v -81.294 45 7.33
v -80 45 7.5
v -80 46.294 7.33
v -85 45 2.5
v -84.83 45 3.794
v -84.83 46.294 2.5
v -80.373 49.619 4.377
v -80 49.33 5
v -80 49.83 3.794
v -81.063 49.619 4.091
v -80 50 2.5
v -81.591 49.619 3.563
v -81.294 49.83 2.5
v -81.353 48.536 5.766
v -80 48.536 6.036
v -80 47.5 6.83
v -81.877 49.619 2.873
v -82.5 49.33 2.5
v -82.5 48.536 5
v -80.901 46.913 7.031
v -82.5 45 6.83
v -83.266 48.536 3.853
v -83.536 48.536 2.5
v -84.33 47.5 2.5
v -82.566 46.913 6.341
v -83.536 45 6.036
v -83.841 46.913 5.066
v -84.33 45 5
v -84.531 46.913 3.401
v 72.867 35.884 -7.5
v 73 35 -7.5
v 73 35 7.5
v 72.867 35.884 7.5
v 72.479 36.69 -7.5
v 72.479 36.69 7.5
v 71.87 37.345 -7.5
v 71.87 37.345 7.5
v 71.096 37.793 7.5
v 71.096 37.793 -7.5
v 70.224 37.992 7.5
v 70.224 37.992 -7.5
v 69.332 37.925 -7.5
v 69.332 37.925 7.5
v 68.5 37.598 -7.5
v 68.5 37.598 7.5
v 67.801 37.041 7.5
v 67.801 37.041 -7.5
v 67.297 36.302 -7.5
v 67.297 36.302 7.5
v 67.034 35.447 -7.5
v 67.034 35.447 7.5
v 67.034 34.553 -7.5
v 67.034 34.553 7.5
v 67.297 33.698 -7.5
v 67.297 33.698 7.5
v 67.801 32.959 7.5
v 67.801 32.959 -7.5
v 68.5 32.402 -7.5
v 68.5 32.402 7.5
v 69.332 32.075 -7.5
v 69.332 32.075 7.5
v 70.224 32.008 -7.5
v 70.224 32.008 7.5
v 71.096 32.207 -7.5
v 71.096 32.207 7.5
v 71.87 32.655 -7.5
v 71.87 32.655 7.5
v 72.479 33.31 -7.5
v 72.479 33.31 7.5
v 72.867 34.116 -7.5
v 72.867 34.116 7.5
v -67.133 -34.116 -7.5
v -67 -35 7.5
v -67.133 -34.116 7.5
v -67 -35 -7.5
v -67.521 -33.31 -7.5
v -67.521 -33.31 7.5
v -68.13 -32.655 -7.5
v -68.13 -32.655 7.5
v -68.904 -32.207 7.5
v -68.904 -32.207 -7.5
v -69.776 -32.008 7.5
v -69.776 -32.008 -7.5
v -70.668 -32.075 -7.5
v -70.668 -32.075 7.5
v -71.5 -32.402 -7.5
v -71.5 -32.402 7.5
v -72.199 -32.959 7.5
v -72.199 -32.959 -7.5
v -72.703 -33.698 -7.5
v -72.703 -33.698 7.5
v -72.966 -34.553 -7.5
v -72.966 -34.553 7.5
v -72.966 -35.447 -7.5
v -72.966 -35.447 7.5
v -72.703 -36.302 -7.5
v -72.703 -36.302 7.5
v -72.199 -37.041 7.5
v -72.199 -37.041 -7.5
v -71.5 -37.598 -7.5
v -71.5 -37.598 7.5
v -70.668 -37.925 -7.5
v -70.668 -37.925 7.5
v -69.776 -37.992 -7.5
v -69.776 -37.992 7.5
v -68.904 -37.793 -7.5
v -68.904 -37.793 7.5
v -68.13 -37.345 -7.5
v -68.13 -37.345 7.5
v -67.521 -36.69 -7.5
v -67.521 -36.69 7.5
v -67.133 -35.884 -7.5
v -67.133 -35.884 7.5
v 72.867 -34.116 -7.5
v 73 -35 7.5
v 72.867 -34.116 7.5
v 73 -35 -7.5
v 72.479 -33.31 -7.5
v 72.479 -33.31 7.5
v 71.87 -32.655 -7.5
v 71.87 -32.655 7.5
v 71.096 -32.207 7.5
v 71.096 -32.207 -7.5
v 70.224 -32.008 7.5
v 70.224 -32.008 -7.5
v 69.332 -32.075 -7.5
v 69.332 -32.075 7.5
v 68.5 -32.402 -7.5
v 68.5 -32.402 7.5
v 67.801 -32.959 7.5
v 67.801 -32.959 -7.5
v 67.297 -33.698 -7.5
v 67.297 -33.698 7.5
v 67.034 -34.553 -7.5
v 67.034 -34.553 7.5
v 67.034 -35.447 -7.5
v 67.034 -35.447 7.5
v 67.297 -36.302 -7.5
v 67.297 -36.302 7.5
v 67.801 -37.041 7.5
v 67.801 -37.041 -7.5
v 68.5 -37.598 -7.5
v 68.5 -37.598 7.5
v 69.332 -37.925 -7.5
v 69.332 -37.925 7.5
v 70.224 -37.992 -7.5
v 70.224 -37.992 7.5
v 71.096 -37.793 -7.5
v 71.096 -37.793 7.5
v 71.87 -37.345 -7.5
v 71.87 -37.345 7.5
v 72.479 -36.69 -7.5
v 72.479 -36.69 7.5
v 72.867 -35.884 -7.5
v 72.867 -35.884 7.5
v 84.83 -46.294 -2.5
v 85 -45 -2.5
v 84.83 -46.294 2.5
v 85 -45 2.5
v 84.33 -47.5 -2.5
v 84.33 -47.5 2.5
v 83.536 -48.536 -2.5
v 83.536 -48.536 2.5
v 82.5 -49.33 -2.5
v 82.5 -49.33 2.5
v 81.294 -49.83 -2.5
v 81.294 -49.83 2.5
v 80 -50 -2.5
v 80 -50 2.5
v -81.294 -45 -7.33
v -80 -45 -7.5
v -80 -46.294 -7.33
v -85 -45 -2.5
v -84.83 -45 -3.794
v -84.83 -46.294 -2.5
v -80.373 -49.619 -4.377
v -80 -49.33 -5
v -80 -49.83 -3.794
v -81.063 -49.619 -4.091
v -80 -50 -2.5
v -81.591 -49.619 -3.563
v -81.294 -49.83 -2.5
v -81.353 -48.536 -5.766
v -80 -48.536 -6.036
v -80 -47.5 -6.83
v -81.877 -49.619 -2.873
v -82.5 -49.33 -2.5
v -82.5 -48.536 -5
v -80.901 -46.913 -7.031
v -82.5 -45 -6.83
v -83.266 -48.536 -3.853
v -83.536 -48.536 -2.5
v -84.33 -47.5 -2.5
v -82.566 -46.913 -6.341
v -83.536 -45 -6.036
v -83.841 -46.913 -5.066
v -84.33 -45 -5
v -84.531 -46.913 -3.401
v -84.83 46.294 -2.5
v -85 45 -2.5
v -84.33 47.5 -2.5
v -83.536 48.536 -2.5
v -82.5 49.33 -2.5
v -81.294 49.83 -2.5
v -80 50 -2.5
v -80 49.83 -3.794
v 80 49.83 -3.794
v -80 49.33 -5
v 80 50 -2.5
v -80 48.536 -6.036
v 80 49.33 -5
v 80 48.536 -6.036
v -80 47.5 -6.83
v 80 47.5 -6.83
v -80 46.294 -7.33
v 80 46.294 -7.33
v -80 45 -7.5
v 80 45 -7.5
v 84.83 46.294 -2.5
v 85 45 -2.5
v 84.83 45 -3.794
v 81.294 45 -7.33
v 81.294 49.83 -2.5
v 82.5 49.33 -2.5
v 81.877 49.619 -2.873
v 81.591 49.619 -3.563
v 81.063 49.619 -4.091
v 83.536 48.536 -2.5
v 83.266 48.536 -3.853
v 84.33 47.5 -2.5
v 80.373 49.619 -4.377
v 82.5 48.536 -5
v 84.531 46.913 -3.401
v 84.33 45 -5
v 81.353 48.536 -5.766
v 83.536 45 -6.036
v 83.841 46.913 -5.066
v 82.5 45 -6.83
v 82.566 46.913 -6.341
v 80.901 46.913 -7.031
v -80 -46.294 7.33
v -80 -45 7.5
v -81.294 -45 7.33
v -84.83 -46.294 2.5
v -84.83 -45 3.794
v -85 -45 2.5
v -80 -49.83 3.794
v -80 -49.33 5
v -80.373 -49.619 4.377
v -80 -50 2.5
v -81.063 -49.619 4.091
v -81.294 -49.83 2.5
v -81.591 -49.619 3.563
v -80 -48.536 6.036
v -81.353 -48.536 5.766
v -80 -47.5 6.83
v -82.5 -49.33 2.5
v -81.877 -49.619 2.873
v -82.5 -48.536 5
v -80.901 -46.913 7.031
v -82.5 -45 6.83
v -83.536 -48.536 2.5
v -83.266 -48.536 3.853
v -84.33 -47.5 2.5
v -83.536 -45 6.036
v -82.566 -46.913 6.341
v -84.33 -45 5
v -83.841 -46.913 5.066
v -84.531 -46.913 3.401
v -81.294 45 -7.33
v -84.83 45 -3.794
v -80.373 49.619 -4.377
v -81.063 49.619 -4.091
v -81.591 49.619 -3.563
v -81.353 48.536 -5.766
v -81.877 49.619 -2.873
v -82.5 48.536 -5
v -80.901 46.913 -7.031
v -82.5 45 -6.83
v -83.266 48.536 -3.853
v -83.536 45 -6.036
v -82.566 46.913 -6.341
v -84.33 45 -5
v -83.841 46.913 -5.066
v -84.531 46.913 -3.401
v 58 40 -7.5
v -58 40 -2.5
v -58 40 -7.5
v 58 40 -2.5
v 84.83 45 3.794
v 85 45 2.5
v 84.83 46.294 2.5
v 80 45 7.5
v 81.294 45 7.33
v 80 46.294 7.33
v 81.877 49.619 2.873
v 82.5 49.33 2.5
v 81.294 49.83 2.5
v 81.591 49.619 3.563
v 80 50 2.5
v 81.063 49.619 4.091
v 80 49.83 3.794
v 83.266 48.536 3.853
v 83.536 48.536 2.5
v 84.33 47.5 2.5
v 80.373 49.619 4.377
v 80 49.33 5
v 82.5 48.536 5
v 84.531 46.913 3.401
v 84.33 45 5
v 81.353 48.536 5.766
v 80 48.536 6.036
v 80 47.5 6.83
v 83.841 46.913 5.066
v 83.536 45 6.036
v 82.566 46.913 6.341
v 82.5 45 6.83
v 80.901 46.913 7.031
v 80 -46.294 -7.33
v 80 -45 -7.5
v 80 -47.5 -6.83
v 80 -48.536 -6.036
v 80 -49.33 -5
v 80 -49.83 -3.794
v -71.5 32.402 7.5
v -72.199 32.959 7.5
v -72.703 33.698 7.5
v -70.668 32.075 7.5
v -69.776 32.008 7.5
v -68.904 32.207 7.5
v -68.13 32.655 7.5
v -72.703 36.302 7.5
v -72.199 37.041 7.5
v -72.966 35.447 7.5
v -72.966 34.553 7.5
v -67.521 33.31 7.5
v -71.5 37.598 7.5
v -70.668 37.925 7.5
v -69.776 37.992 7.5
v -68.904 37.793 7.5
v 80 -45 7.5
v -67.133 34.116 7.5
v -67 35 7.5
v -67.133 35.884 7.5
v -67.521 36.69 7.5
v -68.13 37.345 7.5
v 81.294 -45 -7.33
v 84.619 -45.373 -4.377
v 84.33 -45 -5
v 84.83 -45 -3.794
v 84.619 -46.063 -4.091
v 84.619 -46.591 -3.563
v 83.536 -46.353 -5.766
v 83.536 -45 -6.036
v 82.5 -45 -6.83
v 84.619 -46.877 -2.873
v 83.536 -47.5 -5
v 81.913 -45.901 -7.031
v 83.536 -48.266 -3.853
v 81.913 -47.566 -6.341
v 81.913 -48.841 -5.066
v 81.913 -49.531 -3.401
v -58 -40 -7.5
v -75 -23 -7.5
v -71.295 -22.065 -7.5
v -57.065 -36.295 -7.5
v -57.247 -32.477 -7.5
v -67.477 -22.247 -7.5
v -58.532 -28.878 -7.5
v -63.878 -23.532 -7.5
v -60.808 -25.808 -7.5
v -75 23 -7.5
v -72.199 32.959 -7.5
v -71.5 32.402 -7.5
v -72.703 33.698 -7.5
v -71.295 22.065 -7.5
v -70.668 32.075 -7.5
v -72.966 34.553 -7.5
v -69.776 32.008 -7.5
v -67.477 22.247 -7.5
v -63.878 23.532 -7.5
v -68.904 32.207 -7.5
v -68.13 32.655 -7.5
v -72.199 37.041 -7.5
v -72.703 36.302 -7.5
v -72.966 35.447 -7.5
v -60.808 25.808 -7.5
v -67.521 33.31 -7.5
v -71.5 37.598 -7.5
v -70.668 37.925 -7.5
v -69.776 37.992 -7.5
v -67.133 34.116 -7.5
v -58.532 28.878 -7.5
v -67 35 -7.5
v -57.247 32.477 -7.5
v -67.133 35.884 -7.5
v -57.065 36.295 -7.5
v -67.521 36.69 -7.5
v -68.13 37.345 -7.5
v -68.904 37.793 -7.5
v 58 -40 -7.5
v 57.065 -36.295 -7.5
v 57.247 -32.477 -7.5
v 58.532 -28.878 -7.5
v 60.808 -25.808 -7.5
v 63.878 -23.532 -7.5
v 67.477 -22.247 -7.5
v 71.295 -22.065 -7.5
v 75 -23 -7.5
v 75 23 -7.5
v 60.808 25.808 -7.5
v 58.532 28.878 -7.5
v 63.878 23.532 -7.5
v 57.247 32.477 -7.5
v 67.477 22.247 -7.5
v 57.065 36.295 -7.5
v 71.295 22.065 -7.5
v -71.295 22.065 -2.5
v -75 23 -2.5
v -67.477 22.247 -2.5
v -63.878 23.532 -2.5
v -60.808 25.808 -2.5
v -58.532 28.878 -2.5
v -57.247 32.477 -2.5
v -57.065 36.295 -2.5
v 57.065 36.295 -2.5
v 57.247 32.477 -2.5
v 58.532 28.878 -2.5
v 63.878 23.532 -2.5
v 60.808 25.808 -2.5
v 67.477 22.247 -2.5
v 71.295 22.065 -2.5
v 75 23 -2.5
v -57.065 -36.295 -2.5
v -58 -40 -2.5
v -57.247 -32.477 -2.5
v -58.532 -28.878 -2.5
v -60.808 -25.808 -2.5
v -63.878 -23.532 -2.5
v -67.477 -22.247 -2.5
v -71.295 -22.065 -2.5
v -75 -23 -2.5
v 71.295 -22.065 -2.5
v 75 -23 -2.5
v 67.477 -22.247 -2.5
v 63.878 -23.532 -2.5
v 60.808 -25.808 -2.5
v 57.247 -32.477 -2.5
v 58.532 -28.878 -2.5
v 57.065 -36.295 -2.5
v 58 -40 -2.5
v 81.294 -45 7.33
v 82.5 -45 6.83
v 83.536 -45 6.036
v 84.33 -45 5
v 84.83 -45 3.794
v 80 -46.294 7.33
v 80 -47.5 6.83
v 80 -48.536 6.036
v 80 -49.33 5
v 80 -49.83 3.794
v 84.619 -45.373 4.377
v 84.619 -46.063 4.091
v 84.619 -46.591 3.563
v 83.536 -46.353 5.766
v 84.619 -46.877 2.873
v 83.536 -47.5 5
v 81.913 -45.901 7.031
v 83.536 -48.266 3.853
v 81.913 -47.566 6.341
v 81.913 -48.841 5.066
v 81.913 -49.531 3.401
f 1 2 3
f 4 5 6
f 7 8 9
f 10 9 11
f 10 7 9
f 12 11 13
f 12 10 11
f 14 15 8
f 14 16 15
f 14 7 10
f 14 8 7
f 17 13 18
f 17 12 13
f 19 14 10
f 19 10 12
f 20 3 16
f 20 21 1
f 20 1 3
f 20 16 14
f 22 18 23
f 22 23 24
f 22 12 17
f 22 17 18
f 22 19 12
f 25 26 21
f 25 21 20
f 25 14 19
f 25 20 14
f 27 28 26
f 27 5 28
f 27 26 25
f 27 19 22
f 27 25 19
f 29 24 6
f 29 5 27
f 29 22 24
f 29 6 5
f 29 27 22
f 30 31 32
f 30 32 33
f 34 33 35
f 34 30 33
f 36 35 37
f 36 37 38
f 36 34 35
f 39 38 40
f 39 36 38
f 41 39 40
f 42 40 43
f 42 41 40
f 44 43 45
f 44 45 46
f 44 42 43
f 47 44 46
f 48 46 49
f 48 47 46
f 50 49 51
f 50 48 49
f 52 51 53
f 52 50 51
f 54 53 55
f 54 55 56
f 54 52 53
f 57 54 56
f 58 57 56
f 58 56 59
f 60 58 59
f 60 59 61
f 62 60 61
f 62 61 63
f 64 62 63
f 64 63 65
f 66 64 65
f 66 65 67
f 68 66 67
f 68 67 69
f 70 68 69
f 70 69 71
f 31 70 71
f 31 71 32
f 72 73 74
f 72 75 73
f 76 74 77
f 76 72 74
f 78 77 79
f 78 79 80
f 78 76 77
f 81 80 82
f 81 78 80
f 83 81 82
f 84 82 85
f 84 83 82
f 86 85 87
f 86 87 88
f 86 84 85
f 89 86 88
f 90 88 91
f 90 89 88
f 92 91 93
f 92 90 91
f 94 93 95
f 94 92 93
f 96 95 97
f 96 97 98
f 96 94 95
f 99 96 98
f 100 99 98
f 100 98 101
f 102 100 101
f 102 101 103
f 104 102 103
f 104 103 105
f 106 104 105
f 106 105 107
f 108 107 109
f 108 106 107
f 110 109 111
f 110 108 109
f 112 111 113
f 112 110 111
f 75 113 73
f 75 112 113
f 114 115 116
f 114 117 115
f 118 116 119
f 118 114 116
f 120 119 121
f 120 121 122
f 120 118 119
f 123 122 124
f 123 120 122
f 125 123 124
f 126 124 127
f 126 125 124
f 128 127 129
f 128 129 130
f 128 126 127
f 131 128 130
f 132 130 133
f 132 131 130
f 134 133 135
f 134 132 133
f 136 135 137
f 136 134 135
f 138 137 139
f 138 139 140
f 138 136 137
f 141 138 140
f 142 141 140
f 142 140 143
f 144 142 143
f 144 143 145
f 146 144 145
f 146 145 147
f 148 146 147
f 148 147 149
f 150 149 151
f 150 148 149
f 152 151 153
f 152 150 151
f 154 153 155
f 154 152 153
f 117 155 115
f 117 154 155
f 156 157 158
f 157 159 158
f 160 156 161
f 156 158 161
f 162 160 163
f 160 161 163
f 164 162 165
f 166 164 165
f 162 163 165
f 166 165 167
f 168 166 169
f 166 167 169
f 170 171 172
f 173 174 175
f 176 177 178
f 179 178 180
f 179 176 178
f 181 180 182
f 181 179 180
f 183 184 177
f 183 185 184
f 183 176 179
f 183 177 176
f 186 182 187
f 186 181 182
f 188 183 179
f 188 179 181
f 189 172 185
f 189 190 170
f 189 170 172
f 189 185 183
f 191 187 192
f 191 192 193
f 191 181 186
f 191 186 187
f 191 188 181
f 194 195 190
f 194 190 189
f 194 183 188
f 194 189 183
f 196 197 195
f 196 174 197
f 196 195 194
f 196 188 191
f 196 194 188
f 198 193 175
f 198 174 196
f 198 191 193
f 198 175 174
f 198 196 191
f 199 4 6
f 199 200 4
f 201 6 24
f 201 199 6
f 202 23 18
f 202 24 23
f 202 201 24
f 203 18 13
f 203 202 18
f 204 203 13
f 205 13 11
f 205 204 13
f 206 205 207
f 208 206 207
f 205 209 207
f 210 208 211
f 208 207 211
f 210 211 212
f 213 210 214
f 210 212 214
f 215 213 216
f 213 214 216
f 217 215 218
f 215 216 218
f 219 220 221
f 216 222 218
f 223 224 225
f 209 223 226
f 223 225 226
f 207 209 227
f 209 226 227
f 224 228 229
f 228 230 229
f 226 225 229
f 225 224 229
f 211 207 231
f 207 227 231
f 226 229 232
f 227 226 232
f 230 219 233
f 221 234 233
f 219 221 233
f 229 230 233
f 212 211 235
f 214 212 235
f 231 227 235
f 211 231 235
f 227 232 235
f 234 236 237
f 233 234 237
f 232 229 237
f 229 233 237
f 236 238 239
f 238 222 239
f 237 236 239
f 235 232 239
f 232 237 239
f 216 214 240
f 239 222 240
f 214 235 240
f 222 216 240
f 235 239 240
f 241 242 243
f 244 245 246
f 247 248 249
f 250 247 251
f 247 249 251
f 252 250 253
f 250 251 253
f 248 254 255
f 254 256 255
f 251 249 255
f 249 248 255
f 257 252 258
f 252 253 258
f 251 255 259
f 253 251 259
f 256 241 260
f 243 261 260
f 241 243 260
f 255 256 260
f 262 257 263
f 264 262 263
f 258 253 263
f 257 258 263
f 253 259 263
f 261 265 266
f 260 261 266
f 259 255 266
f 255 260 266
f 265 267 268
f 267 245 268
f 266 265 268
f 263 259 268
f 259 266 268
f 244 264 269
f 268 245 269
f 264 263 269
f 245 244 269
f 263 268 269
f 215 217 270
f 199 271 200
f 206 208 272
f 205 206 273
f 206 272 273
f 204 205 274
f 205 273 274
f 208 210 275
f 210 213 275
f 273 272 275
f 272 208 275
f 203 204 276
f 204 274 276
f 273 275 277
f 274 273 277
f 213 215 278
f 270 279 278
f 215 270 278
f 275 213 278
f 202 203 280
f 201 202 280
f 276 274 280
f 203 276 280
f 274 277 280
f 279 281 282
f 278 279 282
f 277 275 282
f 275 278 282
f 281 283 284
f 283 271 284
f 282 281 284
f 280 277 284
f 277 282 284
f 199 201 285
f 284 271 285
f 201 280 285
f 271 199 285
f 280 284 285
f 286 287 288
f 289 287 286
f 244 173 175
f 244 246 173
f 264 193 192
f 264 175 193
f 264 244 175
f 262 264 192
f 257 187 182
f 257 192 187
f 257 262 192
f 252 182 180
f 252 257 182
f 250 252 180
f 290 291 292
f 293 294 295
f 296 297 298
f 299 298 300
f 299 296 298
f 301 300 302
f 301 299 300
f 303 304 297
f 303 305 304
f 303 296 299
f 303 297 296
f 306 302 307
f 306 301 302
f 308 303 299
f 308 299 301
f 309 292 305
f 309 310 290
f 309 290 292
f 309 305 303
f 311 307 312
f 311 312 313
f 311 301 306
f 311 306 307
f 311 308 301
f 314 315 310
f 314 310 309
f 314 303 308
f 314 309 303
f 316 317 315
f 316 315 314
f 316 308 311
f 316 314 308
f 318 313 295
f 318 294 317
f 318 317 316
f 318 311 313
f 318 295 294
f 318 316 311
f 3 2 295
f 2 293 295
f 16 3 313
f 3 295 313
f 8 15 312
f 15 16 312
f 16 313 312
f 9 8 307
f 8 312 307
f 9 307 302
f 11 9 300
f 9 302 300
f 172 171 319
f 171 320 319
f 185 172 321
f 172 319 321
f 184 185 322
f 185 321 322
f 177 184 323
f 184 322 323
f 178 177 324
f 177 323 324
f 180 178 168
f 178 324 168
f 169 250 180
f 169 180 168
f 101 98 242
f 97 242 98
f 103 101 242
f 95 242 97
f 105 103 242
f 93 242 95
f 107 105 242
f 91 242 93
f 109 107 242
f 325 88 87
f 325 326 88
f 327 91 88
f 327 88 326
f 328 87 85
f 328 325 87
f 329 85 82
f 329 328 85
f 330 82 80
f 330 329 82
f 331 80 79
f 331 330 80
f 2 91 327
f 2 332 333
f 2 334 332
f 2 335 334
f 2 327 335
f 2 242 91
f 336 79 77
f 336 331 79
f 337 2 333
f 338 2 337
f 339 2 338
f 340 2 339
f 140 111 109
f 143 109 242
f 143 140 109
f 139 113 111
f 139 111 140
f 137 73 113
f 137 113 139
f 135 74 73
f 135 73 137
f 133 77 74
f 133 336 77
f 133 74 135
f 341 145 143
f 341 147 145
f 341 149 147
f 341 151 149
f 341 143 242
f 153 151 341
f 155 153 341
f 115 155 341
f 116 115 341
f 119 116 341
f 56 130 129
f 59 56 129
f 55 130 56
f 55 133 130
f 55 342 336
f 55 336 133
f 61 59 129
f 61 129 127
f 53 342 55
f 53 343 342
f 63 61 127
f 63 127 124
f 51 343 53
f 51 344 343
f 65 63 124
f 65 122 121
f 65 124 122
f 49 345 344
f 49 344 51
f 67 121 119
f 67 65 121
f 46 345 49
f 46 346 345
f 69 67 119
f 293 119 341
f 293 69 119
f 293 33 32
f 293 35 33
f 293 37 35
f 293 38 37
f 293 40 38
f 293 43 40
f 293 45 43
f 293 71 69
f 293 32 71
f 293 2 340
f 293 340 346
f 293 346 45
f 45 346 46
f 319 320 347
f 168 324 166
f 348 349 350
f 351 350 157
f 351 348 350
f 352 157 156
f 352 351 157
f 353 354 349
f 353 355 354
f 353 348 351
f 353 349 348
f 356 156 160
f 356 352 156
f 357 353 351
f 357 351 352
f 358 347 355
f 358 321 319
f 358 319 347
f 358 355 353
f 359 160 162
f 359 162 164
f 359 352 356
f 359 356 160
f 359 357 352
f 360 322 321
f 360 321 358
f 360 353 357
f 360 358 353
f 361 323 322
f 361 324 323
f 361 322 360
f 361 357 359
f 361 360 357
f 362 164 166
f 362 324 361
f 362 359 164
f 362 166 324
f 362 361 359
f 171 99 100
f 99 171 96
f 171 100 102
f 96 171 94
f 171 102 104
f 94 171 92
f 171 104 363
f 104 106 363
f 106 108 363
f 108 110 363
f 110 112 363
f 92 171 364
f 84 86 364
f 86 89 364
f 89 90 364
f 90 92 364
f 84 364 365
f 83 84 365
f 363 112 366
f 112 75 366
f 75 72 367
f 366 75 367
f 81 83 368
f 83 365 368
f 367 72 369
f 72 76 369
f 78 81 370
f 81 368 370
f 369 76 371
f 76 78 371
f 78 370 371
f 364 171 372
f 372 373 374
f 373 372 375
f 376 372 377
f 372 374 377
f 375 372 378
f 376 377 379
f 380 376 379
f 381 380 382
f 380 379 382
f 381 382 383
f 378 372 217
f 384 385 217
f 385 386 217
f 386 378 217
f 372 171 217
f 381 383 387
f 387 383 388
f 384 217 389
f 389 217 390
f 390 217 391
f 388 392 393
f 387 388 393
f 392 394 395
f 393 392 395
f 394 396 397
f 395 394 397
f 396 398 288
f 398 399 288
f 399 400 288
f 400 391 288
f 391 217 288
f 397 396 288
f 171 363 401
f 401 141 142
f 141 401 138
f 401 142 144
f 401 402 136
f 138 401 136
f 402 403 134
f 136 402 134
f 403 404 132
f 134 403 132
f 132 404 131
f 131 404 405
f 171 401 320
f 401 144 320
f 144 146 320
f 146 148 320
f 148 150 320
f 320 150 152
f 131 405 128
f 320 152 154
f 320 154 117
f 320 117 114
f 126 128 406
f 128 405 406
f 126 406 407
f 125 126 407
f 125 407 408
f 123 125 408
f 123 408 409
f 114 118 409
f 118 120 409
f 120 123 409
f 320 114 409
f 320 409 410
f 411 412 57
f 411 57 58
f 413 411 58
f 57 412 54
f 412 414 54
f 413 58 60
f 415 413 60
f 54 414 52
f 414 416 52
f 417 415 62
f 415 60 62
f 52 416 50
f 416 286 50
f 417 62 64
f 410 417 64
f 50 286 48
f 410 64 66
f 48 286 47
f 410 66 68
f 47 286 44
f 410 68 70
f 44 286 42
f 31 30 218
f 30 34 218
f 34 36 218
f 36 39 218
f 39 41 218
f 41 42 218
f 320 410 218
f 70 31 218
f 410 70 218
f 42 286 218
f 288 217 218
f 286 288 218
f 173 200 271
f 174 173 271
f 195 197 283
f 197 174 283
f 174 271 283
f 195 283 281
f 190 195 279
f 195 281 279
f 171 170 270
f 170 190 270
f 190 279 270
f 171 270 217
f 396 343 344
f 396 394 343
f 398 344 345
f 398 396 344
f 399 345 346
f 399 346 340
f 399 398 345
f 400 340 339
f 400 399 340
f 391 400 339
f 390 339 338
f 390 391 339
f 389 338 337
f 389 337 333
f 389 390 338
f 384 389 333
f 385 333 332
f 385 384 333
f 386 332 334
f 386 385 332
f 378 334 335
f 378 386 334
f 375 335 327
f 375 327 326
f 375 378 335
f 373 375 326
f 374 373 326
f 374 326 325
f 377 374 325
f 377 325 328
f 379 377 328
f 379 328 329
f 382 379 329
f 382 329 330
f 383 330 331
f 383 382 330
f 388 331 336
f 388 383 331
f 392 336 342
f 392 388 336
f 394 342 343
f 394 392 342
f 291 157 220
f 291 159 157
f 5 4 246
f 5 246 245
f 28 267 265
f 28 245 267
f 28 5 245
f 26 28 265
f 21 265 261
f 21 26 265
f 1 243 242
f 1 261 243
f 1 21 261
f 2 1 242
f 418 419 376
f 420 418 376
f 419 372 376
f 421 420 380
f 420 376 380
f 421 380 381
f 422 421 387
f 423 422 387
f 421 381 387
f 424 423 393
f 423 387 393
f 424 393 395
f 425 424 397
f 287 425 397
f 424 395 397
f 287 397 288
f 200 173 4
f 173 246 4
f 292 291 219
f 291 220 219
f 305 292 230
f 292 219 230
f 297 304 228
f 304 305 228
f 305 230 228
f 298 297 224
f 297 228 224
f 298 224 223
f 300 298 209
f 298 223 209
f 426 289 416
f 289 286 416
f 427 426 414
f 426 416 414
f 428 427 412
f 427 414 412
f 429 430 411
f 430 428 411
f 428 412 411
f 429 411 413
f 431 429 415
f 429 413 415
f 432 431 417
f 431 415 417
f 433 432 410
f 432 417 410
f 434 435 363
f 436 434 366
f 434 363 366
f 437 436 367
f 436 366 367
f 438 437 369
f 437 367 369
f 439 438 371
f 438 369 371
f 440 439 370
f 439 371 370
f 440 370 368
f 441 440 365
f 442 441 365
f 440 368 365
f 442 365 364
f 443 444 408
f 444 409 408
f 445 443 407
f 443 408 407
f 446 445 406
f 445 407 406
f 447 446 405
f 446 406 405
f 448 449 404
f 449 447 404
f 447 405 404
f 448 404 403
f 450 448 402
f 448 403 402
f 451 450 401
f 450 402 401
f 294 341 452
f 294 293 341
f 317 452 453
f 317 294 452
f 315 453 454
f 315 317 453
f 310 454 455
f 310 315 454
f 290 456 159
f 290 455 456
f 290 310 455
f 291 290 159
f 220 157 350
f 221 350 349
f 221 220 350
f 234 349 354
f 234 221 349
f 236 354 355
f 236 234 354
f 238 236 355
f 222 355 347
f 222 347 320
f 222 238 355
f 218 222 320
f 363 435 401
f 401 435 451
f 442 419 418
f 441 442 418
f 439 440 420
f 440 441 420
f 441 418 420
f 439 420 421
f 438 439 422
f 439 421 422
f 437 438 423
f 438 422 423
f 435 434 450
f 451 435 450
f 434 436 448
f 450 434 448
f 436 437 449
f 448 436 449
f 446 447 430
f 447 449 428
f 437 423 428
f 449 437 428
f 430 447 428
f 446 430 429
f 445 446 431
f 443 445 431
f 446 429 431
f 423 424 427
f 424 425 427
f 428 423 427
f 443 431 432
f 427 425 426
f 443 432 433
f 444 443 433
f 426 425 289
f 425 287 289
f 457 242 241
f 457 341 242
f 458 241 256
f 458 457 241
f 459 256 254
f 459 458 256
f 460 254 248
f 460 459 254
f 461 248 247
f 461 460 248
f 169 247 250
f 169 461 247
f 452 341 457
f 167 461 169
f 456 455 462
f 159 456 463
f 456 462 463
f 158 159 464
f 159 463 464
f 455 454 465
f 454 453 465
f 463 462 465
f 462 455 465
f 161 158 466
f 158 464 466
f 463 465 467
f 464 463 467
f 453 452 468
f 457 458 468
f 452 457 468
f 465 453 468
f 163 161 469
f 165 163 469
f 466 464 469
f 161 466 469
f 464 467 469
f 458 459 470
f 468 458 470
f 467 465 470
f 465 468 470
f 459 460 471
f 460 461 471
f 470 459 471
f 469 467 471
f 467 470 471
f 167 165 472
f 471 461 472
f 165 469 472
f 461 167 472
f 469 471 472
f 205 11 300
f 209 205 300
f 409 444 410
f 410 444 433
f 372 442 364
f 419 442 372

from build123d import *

# Parameters (mm, degrees)
F0_W     = 170
F0_H     = 100
F0_R     = 3
F1_DEPTH = 7.5
F2_T     = -10
F3_R     = 5
F4_R     = 3
F5_DEPTH = 5


with BuildPart() as f1:
    # F0 (on Top) → F1 (new body, symmetric)
    with BuildSketch(Plane.XY):
        Rectangle(F0_W, F0_H)
        with Locations((-70, -35)):
            Circle(F0_R, mode=Mode.SUBTRACT)
        with Locations((70, -35)):
            Circle(F0_R, mode=Mode.SUBTRACT)
        with Locations((-70, 35)):
            Circle(F0_R, mode=Mode.SUBTRACT)
        with Locations((70, 35)):
            Circle(F0_R, mode=Mode.SUBTRACT)
    extrude(amount=F1_DEPTH, both=True)

    # F2
    f2_openings = [f1.faces().sort_by_distance(p)[0] for p in [
        (0, 0, -7.5),
    ]]
    offset(amount=F2_T, openings=f2_openings, kind=Kind.INTERSECTION)

    # F3
    f3_edges = [f1.edges().sort_by_distance(p)[0] for p in [
        (-85, 0, -7.5),
        (-85, 0, 7.5),
        (0, -50, 7.5),
        (0, -50, -7.5),
        (85, 0, -7.5),
        (85, 0, 7.5),
        (85, 50, 0),
        (0, 50, 7.5),
        (0, 50, -7.5),
        (-85, 50, 0),
        (-85, -50, 0),
        (85, -50, 0),
    ]]
    fillet(f3_edges, radius=F3_R)

    # F4 (on face) → F5 (join)
    with BuildSketch(Plane(origin=(0, 0, -2.5), x_dir=(1, 0, 0), z_dir=(0, 0, -1))):
        with BuildLine():
            Line((65, -40), (75, -40))
            Line((75, -40), (75, -30))
            ThreePointArc((75, -30), (65, -30), (65, -40))
        make_face()
        with Locations((70, -35)):
            Circle(F4_R, mode=Mode.SUBTRACT)
        with BuildLine():
            Line((-75, -30), (-75, -40))
            Line((-75, -40), (-65, -40))
            ThreePointArc((-65, -40), (-65, -30), (-75, -30))
        make_face()
        with Locations((-70, -35)):
            Circle(F4_R, mode=Mode.SUBTRACT)
        with BuildLine():
            Line((-65, 40), (-75, 40))
            Line((-75, 40), (-75, 30))
            ThreePointArc((-75, 30), (-65, 30), (-65, 40))
        make_face()
        with Locations((-70, 35)):
            Circle(F4_R, mode=Mode.SUBTRACT)
        with BuildLine():
            Line((75, 30), (75, 40))
            Line((75, 40), (65, 40))
            ThreePointArc((65, 40), (65, 30), (75, 30))
        make_face()
        with Locations((70, 35)):
            Circle(F4_R, mode=Mode.SUBTRACT)
    extrude(amount=F5_DEPTH)


solid = f1.part
